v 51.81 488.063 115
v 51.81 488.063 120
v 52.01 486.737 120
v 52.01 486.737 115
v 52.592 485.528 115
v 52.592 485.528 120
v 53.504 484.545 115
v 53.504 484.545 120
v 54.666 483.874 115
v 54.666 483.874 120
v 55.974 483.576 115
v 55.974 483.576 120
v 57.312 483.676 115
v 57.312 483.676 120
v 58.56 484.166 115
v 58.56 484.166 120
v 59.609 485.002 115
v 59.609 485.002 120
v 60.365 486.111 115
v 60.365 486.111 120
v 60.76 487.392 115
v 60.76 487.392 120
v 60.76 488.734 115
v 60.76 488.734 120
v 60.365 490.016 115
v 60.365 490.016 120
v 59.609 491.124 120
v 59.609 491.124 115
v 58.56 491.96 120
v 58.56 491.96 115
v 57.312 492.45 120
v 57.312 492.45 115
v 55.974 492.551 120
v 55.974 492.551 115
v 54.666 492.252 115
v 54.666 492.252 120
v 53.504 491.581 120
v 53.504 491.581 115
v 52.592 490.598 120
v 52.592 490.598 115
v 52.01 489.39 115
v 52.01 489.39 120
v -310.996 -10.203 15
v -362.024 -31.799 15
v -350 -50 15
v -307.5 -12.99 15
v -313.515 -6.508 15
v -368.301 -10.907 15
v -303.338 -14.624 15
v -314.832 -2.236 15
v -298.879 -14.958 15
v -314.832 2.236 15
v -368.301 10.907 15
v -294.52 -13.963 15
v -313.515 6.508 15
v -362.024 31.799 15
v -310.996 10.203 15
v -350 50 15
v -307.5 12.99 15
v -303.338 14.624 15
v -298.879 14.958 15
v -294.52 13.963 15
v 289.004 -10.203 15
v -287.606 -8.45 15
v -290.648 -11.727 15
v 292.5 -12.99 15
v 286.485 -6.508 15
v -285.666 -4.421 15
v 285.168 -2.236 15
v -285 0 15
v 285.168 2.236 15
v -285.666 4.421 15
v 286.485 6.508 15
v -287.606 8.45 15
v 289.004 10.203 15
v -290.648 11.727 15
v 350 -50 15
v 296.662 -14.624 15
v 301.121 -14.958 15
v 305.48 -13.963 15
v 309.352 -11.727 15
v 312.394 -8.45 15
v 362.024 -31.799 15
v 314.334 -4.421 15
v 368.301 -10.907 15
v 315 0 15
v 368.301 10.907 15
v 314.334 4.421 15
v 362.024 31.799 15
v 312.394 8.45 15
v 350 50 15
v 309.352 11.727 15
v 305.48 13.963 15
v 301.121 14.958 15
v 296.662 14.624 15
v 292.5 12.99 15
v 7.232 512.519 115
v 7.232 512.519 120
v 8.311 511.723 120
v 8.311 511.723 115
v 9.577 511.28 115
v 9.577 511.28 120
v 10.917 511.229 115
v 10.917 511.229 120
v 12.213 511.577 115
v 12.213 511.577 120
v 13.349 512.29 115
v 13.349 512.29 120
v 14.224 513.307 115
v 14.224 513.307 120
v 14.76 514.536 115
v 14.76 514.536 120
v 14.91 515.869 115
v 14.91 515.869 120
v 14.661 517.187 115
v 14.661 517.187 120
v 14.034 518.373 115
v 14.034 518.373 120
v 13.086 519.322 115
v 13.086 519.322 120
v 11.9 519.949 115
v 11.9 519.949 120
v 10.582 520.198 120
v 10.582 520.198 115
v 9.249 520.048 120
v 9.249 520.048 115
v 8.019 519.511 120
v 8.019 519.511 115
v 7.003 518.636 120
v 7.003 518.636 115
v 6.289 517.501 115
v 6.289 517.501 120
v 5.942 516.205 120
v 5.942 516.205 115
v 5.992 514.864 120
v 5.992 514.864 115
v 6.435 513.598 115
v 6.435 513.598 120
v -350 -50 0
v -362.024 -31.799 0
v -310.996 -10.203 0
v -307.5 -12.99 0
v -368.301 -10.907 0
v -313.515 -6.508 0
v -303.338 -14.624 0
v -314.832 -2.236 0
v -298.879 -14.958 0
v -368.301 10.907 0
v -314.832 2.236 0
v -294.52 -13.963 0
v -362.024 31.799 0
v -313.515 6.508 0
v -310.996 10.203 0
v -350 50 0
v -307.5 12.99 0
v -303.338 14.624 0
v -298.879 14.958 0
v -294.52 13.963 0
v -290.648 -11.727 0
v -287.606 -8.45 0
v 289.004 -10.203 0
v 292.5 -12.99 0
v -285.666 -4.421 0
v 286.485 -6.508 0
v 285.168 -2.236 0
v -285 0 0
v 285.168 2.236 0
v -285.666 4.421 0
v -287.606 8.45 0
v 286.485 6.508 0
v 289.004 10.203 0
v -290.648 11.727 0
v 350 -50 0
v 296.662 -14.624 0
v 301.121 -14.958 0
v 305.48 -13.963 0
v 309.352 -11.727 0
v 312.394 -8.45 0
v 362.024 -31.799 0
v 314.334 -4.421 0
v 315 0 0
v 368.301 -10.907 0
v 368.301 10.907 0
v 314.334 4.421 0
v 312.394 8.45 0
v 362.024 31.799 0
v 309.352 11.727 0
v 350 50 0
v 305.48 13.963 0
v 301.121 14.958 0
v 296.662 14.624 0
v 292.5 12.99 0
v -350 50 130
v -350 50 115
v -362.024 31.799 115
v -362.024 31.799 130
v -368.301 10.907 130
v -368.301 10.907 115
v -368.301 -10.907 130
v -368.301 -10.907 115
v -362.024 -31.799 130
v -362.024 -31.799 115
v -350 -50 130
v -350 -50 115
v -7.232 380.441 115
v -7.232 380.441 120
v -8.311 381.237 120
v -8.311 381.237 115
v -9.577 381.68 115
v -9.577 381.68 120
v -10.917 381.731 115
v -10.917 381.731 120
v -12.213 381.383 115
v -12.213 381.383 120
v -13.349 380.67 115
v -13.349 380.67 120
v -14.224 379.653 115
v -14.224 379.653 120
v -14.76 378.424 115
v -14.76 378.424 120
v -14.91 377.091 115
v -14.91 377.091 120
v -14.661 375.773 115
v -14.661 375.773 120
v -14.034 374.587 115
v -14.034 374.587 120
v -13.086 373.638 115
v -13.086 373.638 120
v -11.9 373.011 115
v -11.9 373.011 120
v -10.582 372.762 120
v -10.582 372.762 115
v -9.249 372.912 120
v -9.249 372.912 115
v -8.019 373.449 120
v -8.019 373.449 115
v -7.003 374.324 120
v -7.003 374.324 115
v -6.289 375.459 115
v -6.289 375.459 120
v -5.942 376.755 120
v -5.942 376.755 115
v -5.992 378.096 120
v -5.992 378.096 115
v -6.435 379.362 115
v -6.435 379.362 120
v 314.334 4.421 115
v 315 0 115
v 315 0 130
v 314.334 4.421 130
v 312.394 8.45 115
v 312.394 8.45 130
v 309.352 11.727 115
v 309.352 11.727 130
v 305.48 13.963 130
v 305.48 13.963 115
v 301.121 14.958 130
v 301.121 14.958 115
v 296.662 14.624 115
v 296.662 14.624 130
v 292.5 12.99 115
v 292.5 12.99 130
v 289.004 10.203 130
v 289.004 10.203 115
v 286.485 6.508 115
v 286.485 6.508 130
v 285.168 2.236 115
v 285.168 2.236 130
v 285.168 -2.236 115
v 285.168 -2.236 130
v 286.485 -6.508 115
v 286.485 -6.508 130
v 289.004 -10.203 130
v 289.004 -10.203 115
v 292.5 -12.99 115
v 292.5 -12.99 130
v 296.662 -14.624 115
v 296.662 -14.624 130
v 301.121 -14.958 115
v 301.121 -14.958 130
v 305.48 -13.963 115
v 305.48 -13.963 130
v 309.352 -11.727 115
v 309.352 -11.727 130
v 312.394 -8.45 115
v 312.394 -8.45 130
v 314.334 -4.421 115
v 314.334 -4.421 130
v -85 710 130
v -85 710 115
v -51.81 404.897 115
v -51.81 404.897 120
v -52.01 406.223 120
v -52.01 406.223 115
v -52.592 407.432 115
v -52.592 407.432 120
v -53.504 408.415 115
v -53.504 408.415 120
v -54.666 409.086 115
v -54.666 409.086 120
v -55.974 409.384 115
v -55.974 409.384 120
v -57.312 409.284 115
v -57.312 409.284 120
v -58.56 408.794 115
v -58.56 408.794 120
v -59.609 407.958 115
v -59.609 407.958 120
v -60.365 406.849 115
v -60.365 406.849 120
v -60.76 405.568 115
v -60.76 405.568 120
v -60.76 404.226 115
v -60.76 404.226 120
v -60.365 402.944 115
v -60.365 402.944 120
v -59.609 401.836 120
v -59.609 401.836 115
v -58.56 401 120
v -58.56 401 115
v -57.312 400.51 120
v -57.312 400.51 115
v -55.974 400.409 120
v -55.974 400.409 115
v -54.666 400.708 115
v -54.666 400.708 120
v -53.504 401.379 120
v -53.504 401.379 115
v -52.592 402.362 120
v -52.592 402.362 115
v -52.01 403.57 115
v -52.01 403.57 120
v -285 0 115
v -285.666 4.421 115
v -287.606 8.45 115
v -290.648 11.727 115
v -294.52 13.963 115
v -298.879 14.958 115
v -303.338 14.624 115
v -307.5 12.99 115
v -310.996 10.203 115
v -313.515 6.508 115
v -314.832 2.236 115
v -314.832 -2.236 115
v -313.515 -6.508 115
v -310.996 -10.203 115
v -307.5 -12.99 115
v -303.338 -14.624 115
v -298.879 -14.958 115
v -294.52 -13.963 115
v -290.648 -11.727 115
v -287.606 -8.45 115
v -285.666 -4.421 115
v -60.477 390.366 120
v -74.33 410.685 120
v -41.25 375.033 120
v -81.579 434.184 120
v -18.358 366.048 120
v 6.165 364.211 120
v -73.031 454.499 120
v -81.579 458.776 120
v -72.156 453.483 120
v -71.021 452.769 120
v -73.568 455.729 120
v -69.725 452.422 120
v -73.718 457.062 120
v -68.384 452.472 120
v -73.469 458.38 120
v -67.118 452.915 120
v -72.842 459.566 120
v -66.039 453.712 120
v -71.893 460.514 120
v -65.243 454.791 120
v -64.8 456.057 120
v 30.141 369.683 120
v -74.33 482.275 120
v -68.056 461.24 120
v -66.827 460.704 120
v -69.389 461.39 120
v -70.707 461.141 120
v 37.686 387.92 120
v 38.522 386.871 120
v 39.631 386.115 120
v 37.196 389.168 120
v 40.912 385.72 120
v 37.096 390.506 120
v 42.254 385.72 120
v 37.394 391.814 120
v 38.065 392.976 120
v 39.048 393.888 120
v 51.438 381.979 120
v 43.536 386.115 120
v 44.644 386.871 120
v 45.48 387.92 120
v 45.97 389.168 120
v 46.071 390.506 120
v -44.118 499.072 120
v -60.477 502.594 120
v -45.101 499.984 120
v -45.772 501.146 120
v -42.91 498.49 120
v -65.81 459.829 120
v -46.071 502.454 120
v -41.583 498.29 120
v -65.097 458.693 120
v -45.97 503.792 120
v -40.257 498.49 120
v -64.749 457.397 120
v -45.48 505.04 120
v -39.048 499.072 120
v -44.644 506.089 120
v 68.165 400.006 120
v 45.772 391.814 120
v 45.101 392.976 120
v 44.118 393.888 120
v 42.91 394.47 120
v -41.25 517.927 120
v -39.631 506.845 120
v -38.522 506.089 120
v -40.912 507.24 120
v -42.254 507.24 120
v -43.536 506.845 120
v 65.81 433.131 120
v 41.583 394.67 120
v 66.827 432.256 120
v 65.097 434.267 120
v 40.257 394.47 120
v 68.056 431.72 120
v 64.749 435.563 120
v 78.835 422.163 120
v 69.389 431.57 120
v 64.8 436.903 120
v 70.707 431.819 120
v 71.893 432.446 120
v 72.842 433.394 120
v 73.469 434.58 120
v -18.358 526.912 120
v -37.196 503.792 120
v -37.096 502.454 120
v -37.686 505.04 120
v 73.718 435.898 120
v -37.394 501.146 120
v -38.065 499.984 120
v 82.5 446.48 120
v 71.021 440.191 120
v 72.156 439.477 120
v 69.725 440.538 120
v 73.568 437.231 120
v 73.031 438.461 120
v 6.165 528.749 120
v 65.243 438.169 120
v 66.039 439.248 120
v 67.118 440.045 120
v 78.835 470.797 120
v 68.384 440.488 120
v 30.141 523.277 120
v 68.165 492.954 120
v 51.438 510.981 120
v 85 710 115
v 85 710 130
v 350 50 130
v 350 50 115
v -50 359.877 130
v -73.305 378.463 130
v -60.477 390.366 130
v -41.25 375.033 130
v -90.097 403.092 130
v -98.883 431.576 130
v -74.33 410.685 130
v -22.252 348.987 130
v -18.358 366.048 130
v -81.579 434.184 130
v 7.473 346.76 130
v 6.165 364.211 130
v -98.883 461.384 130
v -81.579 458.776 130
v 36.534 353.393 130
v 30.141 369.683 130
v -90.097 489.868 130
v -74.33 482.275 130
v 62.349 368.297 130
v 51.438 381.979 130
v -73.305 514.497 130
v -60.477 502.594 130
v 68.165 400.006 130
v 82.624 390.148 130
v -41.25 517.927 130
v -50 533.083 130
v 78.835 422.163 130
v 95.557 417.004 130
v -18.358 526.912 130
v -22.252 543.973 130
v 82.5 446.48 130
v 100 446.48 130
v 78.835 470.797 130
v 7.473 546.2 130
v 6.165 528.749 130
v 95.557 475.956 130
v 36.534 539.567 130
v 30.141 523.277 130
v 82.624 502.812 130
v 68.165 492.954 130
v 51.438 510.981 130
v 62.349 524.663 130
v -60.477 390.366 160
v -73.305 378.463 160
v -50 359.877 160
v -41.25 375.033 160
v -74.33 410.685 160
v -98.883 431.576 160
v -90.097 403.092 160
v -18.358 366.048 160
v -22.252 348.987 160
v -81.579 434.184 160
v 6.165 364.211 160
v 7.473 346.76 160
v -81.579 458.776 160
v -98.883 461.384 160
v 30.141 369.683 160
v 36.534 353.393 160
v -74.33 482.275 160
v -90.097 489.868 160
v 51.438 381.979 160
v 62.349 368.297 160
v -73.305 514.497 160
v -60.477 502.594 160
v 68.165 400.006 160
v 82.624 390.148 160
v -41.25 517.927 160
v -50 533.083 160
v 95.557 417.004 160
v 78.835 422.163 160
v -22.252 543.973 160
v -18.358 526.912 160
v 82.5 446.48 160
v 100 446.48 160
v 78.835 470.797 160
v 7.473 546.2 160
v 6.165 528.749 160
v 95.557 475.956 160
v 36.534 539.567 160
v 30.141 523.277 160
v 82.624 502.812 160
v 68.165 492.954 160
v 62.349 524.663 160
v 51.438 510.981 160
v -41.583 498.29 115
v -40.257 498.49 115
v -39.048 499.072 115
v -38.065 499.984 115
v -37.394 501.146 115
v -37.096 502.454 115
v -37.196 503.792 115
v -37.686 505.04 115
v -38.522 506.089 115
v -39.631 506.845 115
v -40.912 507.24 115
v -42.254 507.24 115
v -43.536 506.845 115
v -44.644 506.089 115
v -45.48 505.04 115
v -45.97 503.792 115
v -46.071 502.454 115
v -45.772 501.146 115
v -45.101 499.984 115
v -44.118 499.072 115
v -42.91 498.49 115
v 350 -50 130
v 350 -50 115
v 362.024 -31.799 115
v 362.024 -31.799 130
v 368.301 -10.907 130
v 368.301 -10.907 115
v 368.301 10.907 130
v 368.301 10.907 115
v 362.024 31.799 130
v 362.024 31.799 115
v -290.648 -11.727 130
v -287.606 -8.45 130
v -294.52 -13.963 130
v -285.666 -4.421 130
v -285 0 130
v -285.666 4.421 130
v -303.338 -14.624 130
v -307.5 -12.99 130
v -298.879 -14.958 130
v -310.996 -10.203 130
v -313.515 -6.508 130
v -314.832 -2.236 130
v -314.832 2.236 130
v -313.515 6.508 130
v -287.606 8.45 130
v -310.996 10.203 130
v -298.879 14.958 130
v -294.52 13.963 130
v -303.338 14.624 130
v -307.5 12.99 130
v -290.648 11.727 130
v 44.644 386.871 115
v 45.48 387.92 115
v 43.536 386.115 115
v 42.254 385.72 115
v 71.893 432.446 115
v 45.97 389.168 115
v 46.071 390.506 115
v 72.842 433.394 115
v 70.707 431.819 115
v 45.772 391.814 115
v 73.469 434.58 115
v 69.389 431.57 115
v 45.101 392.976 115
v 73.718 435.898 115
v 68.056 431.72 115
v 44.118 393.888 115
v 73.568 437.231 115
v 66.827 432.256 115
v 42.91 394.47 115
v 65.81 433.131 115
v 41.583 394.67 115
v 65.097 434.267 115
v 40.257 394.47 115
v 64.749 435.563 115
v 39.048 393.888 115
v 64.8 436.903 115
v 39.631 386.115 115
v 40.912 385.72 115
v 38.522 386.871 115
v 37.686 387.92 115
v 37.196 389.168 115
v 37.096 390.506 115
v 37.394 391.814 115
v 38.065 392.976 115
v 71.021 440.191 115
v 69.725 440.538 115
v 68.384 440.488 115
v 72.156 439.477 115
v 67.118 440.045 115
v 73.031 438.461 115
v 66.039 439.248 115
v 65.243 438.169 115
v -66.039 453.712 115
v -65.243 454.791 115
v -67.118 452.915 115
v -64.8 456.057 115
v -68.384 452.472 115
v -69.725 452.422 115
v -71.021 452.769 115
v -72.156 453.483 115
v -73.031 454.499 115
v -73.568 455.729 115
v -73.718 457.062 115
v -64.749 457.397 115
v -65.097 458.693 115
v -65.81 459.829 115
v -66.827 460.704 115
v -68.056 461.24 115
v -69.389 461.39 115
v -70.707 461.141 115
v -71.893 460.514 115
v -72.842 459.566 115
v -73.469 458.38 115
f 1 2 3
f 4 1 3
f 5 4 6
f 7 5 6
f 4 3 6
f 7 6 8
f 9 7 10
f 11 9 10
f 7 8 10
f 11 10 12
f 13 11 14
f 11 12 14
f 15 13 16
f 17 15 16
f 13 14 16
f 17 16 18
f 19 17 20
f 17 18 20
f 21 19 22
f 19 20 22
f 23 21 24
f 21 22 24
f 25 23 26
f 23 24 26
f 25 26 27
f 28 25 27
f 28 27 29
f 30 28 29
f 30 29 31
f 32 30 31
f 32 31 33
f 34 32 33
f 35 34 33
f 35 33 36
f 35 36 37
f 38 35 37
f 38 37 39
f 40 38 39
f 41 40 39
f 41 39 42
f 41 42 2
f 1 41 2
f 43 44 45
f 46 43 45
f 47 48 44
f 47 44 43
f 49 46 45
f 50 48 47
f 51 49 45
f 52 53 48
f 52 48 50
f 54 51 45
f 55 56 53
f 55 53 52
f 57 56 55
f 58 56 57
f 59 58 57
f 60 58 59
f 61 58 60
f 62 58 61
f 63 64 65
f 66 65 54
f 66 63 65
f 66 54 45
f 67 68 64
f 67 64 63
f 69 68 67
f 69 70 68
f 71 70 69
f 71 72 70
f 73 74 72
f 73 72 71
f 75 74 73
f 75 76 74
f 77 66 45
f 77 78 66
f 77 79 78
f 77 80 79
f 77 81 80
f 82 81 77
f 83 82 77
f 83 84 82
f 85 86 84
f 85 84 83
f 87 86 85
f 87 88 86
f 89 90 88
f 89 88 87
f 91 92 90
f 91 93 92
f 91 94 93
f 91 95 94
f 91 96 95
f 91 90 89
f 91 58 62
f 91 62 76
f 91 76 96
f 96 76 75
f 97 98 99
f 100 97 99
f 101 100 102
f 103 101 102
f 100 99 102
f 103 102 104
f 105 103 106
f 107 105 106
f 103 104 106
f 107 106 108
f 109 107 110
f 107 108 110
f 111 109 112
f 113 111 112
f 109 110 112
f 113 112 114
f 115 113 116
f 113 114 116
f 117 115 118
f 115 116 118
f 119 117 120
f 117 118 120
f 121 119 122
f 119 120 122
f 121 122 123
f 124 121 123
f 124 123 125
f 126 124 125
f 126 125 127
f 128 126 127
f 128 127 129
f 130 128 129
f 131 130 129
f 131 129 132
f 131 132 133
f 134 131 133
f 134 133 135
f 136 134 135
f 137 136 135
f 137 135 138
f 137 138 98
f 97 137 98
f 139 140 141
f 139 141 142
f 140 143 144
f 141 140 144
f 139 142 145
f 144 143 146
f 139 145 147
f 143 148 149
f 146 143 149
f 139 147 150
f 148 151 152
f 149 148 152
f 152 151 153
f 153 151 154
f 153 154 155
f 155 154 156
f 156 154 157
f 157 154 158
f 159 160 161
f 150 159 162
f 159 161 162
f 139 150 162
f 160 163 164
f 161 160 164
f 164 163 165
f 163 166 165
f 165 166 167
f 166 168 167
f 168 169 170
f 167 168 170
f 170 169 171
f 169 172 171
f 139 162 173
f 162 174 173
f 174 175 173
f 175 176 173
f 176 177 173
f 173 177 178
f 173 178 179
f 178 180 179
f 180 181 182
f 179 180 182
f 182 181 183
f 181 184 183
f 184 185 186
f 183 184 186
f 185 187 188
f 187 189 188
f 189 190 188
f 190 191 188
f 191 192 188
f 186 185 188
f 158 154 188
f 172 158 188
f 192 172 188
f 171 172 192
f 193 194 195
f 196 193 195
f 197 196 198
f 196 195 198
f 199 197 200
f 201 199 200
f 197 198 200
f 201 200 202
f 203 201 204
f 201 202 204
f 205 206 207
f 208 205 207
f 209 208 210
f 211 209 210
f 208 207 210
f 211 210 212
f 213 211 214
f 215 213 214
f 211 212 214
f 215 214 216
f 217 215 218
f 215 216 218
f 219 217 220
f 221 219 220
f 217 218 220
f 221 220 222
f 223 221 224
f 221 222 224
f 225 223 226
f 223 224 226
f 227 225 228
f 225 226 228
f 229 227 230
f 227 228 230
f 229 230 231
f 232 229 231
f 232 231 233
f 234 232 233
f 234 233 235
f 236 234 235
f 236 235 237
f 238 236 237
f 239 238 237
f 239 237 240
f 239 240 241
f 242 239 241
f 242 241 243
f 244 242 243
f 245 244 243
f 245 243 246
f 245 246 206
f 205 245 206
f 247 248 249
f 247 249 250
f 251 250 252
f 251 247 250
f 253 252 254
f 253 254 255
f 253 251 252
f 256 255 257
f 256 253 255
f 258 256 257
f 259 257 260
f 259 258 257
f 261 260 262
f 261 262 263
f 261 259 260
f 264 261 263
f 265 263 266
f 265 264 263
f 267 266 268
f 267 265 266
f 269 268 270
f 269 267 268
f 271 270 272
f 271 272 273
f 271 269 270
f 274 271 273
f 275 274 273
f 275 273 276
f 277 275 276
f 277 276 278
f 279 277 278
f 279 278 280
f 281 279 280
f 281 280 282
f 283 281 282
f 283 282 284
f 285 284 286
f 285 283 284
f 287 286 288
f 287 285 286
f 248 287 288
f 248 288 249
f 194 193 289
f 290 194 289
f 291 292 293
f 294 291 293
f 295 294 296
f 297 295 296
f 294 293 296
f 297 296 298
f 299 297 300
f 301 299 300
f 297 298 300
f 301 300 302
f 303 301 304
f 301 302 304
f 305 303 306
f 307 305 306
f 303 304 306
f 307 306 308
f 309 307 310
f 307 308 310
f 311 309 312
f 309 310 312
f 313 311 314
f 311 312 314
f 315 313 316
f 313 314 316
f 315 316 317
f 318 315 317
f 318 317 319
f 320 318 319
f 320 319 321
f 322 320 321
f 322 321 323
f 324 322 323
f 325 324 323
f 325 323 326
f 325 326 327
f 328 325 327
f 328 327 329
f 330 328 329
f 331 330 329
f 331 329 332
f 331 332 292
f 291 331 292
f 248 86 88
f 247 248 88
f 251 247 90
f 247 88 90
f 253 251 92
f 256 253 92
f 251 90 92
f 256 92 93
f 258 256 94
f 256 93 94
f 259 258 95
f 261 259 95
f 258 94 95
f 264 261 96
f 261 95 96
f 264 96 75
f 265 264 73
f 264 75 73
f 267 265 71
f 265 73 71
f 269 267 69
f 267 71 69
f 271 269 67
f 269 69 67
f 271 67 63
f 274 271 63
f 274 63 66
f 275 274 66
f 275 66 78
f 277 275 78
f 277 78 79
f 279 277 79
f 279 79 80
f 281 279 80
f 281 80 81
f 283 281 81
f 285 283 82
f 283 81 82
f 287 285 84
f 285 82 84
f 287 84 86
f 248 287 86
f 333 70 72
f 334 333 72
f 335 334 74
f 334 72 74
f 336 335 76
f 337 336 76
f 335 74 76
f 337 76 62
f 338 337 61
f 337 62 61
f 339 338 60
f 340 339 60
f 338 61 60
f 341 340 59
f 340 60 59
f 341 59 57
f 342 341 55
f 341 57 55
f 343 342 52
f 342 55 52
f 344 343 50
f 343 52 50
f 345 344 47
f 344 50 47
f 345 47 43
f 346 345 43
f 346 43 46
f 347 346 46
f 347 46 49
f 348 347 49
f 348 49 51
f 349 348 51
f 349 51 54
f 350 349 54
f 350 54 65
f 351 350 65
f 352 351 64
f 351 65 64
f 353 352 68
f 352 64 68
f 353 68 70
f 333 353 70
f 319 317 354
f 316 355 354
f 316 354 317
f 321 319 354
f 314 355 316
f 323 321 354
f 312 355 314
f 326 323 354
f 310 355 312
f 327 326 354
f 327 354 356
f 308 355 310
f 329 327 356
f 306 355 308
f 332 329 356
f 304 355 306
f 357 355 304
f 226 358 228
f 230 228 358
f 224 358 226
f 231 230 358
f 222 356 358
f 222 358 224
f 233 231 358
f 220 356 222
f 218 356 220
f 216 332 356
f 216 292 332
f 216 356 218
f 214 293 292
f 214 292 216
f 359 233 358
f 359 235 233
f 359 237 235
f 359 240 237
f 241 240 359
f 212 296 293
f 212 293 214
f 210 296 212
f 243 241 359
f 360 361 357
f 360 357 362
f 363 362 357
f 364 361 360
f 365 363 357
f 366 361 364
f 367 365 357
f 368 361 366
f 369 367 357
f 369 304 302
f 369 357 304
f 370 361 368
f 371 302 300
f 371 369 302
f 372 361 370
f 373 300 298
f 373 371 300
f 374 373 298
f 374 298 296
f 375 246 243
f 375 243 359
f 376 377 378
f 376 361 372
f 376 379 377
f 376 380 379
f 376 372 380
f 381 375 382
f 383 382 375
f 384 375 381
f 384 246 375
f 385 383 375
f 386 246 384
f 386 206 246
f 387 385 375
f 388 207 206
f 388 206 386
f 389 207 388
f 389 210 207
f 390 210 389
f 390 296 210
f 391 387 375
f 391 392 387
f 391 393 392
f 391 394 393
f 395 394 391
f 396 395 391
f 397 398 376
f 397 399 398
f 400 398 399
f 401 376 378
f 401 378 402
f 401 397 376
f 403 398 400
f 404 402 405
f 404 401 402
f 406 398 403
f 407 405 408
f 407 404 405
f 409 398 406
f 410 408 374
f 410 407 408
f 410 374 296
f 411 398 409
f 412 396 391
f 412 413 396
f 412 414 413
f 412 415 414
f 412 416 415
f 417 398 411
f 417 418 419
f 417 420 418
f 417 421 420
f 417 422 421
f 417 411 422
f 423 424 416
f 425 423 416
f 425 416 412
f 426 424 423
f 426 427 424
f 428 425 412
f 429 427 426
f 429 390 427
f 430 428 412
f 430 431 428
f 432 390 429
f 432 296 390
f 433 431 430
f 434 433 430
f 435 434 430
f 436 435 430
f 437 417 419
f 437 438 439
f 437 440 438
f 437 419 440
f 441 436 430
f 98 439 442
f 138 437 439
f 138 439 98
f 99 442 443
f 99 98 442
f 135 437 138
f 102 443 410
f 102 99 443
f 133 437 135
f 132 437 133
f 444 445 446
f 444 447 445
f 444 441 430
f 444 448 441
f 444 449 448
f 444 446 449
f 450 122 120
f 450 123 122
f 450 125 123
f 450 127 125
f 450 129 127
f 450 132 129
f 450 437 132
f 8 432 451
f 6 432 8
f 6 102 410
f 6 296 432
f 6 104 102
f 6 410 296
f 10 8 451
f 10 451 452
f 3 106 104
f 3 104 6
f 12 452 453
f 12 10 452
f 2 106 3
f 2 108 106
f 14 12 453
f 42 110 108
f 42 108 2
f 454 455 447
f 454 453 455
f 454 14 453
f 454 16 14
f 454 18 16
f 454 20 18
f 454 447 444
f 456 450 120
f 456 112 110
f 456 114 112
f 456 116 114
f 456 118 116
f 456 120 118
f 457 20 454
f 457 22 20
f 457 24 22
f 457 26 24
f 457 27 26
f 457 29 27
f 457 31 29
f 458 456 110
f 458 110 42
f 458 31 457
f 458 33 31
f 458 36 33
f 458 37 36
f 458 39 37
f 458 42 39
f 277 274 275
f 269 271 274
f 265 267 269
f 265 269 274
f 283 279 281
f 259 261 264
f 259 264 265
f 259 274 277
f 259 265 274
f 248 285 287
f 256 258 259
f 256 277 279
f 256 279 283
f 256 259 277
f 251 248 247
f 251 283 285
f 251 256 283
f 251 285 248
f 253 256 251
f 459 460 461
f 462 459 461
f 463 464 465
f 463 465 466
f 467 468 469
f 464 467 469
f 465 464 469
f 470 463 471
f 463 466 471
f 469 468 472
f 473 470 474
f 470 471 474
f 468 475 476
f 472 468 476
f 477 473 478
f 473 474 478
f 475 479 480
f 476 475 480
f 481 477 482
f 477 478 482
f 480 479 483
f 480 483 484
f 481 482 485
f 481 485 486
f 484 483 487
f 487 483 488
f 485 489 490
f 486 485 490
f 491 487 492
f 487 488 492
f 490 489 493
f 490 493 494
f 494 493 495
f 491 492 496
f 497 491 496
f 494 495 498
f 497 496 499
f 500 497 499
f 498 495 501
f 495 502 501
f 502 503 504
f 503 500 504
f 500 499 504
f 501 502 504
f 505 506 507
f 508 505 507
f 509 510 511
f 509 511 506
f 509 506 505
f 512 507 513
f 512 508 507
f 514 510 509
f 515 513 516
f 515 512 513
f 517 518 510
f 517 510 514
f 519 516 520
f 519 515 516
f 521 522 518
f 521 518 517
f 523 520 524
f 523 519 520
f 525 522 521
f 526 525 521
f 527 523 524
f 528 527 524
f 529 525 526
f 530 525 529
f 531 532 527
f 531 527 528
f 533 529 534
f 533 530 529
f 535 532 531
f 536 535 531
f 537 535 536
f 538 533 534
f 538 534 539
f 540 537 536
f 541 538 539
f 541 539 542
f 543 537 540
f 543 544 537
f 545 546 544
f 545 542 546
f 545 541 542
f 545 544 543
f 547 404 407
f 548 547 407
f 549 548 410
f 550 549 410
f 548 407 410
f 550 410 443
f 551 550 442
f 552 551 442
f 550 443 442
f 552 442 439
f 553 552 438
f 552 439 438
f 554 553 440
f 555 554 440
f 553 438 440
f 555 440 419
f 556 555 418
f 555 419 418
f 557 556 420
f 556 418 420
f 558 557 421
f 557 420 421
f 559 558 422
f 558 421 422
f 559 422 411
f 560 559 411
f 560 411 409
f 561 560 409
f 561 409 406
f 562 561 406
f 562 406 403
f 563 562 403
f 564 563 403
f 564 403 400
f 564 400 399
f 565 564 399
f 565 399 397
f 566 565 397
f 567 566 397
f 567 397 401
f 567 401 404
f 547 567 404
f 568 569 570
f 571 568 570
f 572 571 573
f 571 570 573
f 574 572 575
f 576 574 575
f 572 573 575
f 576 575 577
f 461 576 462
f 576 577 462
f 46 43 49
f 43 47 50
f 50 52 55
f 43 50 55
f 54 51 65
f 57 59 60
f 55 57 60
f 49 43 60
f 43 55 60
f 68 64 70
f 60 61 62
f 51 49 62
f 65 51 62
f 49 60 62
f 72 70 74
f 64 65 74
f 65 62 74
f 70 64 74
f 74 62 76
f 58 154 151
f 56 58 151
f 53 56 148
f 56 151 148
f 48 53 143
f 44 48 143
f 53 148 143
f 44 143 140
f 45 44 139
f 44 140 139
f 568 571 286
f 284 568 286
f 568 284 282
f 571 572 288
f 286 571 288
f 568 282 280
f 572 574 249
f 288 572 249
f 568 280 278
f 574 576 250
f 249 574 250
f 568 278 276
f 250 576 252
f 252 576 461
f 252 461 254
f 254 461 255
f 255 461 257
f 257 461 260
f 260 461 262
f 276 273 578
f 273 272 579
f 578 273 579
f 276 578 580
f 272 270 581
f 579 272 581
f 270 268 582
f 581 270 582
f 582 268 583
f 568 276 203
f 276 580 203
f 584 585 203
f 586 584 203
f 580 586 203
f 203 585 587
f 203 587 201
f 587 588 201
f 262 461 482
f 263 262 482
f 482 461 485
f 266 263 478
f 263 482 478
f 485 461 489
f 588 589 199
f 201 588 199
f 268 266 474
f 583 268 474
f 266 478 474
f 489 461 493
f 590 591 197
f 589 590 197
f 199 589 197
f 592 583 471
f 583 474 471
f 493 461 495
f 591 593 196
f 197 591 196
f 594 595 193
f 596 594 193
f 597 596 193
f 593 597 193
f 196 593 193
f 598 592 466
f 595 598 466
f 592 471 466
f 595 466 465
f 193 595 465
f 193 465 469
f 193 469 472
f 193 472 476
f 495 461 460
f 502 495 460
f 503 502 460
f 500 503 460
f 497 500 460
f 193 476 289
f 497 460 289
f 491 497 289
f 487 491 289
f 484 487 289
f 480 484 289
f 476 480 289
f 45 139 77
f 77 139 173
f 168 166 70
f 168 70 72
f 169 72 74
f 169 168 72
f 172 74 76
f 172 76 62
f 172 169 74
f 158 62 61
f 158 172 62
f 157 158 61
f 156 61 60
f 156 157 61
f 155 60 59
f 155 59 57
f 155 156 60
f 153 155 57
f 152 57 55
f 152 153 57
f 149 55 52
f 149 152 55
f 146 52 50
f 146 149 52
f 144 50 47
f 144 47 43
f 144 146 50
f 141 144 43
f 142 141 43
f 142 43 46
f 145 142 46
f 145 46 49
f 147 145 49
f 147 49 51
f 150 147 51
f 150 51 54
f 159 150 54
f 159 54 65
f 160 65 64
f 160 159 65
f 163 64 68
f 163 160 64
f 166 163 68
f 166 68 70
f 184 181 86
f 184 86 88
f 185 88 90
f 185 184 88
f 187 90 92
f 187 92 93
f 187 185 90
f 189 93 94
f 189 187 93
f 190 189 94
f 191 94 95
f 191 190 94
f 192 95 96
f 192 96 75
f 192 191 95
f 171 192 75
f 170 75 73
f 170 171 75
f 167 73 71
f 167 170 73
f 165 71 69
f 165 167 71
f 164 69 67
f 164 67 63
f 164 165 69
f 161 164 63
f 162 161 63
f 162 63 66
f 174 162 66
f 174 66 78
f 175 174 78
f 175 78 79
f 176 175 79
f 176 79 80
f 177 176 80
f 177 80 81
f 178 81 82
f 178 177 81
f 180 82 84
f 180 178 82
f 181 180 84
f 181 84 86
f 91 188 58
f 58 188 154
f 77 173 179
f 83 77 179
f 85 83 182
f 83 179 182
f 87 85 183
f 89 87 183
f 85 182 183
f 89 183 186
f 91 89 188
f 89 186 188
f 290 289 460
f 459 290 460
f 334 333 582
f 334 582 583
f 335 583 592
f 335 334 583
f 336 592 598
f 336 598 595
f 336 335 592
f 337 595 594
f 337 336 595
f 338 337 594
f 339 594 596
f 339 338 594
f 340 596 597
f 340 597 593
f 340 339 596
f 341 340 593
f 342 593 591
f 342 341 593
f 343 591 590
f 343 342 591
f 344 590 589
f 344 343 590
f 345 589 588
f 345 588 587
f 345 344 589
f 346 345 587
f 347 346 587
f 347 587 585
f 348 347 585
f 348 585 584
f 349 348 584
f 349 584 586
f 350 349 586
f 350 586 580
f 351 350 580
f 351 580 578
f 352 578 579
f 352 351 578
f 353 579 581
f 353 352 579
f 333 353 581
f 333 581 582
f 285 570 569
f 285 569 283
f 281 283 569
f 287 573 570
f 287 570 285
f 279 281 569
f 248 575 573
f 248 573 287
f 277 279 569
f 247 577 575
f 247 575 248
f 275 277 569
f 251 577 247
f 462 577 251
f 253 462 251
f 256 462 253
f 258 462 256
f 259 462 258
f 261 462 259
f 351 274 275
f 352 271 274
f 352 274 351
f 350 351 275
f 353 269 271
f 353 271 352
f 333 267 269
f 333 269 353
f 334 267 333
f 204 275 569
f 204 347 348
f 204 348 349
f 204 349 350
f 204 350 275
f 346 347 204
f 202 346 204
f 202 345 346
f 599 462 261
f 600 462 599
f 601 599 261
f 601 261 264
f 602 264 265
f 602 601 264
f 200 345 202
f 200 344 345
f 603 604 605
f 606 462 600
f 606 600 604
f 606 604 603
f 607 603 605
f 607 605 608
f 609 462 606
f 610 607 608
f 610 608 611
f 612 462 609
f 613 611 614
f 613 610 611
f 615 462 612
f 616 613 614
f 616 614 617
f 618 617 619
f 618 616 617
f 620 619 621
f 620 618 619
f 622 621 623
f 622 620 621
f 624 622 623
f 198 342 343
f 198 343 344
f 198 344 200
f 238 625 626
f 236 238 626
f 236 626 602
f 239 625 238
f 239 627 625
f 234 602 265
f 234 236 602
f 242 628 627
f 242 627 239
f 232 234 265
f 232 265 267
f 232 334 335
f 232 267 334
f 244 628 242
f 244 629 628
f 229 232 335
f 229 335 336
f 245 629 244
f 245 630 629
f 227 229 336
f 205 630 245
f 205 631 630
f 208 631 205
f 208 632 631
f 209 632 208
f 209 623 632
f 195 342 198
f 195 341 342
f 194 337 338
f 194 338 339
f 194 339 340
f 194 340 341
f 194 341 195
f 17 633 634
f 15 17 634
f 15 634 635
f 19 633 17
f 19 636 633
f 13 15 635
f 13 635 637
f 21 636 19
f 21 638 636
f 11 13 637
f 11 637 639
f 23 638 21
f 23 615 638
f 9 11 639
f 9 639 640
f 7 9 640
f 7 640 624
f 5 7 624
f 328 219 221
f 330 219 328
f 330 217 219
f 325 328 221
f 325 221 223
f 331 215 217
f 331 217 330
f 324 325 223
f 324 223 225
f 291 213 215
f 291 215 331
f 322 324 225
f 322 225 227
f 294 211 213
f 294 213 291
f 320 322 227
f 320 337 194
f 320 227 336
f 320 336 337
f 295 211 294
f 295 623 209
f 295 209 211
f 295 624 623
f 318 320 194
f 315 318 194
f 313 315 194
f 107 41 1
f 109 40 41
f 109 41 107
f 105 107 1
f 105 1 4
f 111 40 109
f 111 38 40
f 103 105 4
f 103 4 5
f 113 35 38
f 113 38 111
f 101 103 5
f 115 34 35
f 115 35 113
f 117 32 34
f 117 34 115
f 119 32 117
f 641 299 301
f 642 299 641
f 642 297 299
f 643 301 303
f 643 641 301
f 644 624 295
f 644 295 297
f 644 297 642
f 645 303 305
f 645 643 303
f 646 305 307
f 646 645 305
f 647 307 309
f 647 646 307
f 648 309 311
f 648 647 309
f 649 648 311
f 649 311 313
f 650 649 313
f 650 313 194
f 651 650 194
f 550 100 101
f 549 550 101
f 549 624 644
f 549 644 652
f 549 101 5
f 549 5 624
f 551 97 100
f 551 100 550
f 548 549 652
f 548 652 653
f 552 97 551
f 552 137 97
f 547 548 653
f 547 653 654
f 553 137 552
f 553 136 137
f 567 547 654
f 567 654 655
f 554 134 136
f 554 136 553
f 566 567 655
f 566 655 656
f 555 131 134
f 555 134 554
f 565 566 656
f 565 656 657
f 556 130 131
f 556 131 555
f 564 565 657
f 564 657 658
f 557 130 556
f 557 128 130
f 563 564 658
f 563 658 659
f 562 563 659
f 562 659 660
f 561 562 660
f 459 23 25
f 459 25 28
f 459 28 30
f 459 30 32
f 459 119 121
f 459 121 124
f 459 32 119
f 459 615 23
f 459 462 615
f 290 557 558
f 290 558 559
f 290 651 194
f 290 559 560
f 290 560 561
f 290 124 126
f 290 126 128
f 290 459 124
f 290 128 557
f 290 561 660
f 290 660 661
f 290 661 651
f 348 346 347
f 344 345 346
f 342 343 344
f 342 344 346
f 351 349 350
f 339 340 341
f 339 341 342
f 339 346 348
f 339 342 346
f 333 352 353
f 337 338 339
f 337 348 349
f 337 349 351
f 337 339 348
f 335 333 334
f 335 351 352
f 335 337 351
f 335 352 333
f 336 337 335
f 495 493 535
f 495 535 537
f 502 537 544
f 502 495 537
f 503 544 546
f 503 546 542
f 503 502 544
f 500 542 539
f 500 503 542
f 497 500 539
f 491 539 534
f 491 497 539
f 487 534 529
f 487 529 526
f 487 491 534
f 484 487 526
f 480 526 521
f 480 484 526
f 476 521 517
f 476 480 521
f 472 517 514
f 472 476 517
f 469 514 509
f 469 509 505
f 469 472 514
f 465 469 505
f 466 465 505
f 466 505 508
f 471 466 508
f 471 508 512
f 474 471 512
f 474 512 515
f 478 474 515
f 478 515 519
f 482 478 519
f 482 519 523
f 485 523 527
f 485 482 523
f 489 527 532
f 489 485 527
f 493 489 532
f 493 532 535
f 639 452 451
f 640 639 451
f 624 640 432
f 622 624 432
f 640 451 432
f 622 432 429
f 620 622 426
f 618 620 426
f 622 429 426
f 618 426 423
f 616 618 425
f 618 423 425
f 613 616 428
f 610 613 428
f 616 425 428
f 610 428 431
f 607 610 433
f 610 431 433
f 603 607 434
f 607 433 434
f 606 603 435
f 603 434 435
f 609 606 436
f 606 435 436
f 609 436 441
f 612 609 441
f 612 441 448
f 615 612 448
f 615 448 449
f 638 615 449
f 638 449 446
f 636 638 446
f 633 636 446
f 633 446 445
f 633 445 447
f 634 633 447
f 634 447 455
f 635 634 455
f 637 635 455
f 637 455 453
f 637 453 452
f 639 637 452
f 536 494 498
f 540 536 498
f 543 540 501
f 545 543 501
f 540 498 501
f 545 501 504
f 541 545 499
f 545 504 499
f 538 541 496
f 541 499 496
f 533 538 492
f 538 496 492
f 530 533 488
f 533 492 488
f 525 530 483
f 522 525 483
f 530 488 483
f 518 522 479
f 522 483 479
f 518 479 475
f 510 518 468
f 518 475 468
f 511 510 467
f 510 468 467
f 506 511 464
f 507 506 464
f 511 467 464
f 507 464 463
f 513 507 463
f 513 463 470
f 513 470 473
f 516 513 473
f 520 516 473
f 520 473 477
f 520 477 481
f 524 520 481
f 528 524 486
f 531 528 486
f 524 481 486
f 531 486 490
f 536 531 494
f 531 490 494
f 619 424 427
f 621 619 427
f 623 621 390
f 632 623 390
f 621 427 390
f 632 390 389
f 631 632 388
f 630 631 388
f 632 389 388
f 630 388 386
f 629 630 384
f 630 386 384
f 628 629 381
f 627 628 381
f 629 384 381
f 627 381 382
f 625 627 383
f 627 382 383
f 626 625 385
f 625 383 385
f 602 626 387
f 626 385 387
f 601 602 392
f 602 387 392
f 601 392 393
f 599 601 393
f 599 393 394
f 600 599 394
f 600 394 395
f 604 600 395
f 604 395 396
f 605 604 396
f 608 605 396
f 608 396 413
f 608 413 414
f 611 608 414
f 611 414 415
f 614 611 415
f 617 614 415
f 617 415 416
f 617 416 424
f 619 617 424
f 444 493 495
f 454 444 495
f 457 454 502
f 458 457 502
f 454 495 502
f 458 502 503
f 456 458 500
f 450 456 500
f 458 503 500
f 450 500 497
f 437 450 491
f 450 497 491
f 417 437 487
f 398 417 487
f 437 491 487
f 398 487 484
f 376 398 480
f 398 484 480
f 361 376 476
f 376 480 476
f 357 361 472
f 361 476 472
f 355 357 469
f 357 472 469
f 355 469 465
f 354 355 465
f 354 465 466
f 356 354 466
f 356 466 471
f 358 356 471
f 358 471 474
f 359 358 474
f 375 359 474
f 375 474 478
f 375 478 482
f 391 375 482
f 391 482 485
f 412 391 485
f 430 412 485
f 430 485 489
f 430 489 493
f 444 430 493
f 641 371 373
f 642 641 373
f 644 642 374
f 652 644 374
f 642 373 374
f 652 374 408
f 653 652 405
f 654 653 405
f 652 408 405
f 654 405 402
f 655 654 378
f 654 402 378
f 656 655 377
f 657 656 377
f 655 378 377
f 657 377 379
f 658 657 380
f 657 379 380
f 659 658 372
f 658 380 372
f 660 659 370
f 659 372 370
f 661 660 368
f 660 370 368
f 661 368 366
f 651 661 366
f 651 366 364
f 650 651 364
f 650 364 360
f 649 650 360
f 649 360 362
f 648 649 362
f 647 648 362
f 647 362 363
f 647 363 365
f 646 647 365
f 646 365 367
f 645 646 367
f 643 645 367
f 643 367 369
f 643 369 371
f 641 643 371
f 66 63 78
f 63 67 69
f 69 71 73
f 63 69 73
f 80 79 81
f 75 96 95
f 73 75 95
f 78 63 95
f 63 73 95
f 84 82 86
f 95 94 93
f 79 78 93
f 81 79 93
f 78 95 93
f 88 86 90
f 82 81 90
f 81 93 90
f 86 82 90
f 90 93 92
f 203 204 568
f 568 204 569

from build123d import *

# Parameters (mm, degrees)
SKETCH1_R             = 15
BOSS_EXTRUDE1_DEPTH   = 15
LPATTERN1_COUNT       = 2
LPATTERN1_PITCH       = 115
SKETCH3_R             = 15
BOSS_EXTRUDE2_DEPTH   = 100
BOSS_EXTRUDE2_2_DEPTH = 100
BOSS_EXTRUDE3_DEPTH   = 15
SKETCH5_R             = 82.5
CUT_EXTRUDE1_DEPTH    = 811.699423633
SKETCH6_R             = 100
BOSS_EXTRUDE4_DEPTH   = 5
SKETCH7_R             = 100
SKETCH7_R_2           = 82.5
BOSS_EXTRUDE5_DEPTH   = 30
SKETCH9_R             = 4.5
CUT_EXTRUDE2_DEPTH    = 810.156076093
CIRPATTERN1_COUNT     = 8


with BuildPart() as part:
    # Sketch1 → Boss-Extrude1 (new body)
    with BuildSketch(Plane.XY):
        with BuildLine():
            Line((-350, -50), (350, -50))
            ThreePointArc((350, -50), (369.098300563, 0), (350, 50))
            Line((350, 50), (-350, 50))
            ThreePointArc((-350, 50), (-369.098300563, 0), (-350, -50))
        make_face()
        with Locations((-300, 0)):
            Circle(SKETCH1_R, mode=Mode.SUBTRACT)
        with Locations((300, 0)):
            Circle(SKETCH1_R, mode=Mode.SUBTRACT)
    extrude(amount=BOSS_EXTRUDE1_DEPTH)


with BuildPart() as lpattern1_1:
    # LPattern1: pattern copy
    add(part.part.moved(Location(Vector(0, 0, 1) * (1 * LPATTERN1_PITCH))))

    # Sketch4 → Boss-Extrude3 (add)
    with BuildSketch(Plane.XY.offset(130)):
        Polygon((-350, 50), (-85, 710), (85, 710), (350, 50), align=None)
    extrude(amount=-BOSS_EXTRUDE3_DEPTH)

    # Sketch5 → Cut-Extrude1 (cut, through all)
    with BuildSketch(Plane.XY.offset(130)):
        with Locations((0, 446.48)):
            Circle(SKETCH5_R)
    extrude(amount=-CUT_EXTRUDE1_DEPTH, mode=Mode.SUBTRACT)

    # Sketch6 → Boss-Extrude4 (add)
    with BuildSketch(Plane.XY.offset(115)):
        with Locations((0, 446.48)):
            Circle(SKETCH6_R)
    extrude(amount=BOSS_EXTRUDE4_DEPTH)

    # Sketch9 → Cut-Extrude2 (cut, through all)
    with BuildSketch(Plane.XY.offset(120)):
        with Locations((-56.310201511, 404.896815829)):
            Circle(SKETCH9_R)
    cut_extrude2 = extrude(amount=-CUT_EXTRUDE2_DEPTH, mode=Mode.SUBTRACT)

    # CirPattern1: Cut-Extrude2 ×8 about axis
    cirpattern1_axis = Axis((0, 446.48, 0), (0, 0, 1))
    for i in range(1, CIRPATTERN1_COUNT):
        add(cut_extrude2.rotate(cirpattern1_axis, i * 360 / CIRPATTERN1_COUNT), mode=Mode.SUBTRACT)


with BuildPart() as body_3:
    # Sketch3 → Boss-Extrude2 (new body)
    with BuildSketch(Plane.XY.offset(15)):
        with Locations((-300, 0)):
            Circle(SKETCH3_R)
    extrude(amount=BOSS_EXTRUDE2_DEPTH)


with BuildPart() as body_4:
    # Sketch3 → Boss-Extrude2 2 (new body)
    with BuildSketch(Plane.XY.offset(15)):
        with Locations((300, 0)):
            Circle(SKETCH3_R)
    extrude(amount=BOSS_EXTRUDE2_2_DEPTH)


with BuildPart() as body_5:
    # Sketch7 → Boss-Extrude5 (new body)
    with BuildSketch(Plane.XY.offset(130)):
        with Locations((0, 446.48)):
            Circle(SKETCH7_R)
        with Locations((0, 446.48)):
            Circle(SKETCH7_R_2, mode=Mode.SUBTRACT)
    extrude(amount=BOSS_EXTRUDE5_DEPTH)


solid = Compound([part.part, lpattern1_1.part, body_3.part, body_4.part, body_5.part])
